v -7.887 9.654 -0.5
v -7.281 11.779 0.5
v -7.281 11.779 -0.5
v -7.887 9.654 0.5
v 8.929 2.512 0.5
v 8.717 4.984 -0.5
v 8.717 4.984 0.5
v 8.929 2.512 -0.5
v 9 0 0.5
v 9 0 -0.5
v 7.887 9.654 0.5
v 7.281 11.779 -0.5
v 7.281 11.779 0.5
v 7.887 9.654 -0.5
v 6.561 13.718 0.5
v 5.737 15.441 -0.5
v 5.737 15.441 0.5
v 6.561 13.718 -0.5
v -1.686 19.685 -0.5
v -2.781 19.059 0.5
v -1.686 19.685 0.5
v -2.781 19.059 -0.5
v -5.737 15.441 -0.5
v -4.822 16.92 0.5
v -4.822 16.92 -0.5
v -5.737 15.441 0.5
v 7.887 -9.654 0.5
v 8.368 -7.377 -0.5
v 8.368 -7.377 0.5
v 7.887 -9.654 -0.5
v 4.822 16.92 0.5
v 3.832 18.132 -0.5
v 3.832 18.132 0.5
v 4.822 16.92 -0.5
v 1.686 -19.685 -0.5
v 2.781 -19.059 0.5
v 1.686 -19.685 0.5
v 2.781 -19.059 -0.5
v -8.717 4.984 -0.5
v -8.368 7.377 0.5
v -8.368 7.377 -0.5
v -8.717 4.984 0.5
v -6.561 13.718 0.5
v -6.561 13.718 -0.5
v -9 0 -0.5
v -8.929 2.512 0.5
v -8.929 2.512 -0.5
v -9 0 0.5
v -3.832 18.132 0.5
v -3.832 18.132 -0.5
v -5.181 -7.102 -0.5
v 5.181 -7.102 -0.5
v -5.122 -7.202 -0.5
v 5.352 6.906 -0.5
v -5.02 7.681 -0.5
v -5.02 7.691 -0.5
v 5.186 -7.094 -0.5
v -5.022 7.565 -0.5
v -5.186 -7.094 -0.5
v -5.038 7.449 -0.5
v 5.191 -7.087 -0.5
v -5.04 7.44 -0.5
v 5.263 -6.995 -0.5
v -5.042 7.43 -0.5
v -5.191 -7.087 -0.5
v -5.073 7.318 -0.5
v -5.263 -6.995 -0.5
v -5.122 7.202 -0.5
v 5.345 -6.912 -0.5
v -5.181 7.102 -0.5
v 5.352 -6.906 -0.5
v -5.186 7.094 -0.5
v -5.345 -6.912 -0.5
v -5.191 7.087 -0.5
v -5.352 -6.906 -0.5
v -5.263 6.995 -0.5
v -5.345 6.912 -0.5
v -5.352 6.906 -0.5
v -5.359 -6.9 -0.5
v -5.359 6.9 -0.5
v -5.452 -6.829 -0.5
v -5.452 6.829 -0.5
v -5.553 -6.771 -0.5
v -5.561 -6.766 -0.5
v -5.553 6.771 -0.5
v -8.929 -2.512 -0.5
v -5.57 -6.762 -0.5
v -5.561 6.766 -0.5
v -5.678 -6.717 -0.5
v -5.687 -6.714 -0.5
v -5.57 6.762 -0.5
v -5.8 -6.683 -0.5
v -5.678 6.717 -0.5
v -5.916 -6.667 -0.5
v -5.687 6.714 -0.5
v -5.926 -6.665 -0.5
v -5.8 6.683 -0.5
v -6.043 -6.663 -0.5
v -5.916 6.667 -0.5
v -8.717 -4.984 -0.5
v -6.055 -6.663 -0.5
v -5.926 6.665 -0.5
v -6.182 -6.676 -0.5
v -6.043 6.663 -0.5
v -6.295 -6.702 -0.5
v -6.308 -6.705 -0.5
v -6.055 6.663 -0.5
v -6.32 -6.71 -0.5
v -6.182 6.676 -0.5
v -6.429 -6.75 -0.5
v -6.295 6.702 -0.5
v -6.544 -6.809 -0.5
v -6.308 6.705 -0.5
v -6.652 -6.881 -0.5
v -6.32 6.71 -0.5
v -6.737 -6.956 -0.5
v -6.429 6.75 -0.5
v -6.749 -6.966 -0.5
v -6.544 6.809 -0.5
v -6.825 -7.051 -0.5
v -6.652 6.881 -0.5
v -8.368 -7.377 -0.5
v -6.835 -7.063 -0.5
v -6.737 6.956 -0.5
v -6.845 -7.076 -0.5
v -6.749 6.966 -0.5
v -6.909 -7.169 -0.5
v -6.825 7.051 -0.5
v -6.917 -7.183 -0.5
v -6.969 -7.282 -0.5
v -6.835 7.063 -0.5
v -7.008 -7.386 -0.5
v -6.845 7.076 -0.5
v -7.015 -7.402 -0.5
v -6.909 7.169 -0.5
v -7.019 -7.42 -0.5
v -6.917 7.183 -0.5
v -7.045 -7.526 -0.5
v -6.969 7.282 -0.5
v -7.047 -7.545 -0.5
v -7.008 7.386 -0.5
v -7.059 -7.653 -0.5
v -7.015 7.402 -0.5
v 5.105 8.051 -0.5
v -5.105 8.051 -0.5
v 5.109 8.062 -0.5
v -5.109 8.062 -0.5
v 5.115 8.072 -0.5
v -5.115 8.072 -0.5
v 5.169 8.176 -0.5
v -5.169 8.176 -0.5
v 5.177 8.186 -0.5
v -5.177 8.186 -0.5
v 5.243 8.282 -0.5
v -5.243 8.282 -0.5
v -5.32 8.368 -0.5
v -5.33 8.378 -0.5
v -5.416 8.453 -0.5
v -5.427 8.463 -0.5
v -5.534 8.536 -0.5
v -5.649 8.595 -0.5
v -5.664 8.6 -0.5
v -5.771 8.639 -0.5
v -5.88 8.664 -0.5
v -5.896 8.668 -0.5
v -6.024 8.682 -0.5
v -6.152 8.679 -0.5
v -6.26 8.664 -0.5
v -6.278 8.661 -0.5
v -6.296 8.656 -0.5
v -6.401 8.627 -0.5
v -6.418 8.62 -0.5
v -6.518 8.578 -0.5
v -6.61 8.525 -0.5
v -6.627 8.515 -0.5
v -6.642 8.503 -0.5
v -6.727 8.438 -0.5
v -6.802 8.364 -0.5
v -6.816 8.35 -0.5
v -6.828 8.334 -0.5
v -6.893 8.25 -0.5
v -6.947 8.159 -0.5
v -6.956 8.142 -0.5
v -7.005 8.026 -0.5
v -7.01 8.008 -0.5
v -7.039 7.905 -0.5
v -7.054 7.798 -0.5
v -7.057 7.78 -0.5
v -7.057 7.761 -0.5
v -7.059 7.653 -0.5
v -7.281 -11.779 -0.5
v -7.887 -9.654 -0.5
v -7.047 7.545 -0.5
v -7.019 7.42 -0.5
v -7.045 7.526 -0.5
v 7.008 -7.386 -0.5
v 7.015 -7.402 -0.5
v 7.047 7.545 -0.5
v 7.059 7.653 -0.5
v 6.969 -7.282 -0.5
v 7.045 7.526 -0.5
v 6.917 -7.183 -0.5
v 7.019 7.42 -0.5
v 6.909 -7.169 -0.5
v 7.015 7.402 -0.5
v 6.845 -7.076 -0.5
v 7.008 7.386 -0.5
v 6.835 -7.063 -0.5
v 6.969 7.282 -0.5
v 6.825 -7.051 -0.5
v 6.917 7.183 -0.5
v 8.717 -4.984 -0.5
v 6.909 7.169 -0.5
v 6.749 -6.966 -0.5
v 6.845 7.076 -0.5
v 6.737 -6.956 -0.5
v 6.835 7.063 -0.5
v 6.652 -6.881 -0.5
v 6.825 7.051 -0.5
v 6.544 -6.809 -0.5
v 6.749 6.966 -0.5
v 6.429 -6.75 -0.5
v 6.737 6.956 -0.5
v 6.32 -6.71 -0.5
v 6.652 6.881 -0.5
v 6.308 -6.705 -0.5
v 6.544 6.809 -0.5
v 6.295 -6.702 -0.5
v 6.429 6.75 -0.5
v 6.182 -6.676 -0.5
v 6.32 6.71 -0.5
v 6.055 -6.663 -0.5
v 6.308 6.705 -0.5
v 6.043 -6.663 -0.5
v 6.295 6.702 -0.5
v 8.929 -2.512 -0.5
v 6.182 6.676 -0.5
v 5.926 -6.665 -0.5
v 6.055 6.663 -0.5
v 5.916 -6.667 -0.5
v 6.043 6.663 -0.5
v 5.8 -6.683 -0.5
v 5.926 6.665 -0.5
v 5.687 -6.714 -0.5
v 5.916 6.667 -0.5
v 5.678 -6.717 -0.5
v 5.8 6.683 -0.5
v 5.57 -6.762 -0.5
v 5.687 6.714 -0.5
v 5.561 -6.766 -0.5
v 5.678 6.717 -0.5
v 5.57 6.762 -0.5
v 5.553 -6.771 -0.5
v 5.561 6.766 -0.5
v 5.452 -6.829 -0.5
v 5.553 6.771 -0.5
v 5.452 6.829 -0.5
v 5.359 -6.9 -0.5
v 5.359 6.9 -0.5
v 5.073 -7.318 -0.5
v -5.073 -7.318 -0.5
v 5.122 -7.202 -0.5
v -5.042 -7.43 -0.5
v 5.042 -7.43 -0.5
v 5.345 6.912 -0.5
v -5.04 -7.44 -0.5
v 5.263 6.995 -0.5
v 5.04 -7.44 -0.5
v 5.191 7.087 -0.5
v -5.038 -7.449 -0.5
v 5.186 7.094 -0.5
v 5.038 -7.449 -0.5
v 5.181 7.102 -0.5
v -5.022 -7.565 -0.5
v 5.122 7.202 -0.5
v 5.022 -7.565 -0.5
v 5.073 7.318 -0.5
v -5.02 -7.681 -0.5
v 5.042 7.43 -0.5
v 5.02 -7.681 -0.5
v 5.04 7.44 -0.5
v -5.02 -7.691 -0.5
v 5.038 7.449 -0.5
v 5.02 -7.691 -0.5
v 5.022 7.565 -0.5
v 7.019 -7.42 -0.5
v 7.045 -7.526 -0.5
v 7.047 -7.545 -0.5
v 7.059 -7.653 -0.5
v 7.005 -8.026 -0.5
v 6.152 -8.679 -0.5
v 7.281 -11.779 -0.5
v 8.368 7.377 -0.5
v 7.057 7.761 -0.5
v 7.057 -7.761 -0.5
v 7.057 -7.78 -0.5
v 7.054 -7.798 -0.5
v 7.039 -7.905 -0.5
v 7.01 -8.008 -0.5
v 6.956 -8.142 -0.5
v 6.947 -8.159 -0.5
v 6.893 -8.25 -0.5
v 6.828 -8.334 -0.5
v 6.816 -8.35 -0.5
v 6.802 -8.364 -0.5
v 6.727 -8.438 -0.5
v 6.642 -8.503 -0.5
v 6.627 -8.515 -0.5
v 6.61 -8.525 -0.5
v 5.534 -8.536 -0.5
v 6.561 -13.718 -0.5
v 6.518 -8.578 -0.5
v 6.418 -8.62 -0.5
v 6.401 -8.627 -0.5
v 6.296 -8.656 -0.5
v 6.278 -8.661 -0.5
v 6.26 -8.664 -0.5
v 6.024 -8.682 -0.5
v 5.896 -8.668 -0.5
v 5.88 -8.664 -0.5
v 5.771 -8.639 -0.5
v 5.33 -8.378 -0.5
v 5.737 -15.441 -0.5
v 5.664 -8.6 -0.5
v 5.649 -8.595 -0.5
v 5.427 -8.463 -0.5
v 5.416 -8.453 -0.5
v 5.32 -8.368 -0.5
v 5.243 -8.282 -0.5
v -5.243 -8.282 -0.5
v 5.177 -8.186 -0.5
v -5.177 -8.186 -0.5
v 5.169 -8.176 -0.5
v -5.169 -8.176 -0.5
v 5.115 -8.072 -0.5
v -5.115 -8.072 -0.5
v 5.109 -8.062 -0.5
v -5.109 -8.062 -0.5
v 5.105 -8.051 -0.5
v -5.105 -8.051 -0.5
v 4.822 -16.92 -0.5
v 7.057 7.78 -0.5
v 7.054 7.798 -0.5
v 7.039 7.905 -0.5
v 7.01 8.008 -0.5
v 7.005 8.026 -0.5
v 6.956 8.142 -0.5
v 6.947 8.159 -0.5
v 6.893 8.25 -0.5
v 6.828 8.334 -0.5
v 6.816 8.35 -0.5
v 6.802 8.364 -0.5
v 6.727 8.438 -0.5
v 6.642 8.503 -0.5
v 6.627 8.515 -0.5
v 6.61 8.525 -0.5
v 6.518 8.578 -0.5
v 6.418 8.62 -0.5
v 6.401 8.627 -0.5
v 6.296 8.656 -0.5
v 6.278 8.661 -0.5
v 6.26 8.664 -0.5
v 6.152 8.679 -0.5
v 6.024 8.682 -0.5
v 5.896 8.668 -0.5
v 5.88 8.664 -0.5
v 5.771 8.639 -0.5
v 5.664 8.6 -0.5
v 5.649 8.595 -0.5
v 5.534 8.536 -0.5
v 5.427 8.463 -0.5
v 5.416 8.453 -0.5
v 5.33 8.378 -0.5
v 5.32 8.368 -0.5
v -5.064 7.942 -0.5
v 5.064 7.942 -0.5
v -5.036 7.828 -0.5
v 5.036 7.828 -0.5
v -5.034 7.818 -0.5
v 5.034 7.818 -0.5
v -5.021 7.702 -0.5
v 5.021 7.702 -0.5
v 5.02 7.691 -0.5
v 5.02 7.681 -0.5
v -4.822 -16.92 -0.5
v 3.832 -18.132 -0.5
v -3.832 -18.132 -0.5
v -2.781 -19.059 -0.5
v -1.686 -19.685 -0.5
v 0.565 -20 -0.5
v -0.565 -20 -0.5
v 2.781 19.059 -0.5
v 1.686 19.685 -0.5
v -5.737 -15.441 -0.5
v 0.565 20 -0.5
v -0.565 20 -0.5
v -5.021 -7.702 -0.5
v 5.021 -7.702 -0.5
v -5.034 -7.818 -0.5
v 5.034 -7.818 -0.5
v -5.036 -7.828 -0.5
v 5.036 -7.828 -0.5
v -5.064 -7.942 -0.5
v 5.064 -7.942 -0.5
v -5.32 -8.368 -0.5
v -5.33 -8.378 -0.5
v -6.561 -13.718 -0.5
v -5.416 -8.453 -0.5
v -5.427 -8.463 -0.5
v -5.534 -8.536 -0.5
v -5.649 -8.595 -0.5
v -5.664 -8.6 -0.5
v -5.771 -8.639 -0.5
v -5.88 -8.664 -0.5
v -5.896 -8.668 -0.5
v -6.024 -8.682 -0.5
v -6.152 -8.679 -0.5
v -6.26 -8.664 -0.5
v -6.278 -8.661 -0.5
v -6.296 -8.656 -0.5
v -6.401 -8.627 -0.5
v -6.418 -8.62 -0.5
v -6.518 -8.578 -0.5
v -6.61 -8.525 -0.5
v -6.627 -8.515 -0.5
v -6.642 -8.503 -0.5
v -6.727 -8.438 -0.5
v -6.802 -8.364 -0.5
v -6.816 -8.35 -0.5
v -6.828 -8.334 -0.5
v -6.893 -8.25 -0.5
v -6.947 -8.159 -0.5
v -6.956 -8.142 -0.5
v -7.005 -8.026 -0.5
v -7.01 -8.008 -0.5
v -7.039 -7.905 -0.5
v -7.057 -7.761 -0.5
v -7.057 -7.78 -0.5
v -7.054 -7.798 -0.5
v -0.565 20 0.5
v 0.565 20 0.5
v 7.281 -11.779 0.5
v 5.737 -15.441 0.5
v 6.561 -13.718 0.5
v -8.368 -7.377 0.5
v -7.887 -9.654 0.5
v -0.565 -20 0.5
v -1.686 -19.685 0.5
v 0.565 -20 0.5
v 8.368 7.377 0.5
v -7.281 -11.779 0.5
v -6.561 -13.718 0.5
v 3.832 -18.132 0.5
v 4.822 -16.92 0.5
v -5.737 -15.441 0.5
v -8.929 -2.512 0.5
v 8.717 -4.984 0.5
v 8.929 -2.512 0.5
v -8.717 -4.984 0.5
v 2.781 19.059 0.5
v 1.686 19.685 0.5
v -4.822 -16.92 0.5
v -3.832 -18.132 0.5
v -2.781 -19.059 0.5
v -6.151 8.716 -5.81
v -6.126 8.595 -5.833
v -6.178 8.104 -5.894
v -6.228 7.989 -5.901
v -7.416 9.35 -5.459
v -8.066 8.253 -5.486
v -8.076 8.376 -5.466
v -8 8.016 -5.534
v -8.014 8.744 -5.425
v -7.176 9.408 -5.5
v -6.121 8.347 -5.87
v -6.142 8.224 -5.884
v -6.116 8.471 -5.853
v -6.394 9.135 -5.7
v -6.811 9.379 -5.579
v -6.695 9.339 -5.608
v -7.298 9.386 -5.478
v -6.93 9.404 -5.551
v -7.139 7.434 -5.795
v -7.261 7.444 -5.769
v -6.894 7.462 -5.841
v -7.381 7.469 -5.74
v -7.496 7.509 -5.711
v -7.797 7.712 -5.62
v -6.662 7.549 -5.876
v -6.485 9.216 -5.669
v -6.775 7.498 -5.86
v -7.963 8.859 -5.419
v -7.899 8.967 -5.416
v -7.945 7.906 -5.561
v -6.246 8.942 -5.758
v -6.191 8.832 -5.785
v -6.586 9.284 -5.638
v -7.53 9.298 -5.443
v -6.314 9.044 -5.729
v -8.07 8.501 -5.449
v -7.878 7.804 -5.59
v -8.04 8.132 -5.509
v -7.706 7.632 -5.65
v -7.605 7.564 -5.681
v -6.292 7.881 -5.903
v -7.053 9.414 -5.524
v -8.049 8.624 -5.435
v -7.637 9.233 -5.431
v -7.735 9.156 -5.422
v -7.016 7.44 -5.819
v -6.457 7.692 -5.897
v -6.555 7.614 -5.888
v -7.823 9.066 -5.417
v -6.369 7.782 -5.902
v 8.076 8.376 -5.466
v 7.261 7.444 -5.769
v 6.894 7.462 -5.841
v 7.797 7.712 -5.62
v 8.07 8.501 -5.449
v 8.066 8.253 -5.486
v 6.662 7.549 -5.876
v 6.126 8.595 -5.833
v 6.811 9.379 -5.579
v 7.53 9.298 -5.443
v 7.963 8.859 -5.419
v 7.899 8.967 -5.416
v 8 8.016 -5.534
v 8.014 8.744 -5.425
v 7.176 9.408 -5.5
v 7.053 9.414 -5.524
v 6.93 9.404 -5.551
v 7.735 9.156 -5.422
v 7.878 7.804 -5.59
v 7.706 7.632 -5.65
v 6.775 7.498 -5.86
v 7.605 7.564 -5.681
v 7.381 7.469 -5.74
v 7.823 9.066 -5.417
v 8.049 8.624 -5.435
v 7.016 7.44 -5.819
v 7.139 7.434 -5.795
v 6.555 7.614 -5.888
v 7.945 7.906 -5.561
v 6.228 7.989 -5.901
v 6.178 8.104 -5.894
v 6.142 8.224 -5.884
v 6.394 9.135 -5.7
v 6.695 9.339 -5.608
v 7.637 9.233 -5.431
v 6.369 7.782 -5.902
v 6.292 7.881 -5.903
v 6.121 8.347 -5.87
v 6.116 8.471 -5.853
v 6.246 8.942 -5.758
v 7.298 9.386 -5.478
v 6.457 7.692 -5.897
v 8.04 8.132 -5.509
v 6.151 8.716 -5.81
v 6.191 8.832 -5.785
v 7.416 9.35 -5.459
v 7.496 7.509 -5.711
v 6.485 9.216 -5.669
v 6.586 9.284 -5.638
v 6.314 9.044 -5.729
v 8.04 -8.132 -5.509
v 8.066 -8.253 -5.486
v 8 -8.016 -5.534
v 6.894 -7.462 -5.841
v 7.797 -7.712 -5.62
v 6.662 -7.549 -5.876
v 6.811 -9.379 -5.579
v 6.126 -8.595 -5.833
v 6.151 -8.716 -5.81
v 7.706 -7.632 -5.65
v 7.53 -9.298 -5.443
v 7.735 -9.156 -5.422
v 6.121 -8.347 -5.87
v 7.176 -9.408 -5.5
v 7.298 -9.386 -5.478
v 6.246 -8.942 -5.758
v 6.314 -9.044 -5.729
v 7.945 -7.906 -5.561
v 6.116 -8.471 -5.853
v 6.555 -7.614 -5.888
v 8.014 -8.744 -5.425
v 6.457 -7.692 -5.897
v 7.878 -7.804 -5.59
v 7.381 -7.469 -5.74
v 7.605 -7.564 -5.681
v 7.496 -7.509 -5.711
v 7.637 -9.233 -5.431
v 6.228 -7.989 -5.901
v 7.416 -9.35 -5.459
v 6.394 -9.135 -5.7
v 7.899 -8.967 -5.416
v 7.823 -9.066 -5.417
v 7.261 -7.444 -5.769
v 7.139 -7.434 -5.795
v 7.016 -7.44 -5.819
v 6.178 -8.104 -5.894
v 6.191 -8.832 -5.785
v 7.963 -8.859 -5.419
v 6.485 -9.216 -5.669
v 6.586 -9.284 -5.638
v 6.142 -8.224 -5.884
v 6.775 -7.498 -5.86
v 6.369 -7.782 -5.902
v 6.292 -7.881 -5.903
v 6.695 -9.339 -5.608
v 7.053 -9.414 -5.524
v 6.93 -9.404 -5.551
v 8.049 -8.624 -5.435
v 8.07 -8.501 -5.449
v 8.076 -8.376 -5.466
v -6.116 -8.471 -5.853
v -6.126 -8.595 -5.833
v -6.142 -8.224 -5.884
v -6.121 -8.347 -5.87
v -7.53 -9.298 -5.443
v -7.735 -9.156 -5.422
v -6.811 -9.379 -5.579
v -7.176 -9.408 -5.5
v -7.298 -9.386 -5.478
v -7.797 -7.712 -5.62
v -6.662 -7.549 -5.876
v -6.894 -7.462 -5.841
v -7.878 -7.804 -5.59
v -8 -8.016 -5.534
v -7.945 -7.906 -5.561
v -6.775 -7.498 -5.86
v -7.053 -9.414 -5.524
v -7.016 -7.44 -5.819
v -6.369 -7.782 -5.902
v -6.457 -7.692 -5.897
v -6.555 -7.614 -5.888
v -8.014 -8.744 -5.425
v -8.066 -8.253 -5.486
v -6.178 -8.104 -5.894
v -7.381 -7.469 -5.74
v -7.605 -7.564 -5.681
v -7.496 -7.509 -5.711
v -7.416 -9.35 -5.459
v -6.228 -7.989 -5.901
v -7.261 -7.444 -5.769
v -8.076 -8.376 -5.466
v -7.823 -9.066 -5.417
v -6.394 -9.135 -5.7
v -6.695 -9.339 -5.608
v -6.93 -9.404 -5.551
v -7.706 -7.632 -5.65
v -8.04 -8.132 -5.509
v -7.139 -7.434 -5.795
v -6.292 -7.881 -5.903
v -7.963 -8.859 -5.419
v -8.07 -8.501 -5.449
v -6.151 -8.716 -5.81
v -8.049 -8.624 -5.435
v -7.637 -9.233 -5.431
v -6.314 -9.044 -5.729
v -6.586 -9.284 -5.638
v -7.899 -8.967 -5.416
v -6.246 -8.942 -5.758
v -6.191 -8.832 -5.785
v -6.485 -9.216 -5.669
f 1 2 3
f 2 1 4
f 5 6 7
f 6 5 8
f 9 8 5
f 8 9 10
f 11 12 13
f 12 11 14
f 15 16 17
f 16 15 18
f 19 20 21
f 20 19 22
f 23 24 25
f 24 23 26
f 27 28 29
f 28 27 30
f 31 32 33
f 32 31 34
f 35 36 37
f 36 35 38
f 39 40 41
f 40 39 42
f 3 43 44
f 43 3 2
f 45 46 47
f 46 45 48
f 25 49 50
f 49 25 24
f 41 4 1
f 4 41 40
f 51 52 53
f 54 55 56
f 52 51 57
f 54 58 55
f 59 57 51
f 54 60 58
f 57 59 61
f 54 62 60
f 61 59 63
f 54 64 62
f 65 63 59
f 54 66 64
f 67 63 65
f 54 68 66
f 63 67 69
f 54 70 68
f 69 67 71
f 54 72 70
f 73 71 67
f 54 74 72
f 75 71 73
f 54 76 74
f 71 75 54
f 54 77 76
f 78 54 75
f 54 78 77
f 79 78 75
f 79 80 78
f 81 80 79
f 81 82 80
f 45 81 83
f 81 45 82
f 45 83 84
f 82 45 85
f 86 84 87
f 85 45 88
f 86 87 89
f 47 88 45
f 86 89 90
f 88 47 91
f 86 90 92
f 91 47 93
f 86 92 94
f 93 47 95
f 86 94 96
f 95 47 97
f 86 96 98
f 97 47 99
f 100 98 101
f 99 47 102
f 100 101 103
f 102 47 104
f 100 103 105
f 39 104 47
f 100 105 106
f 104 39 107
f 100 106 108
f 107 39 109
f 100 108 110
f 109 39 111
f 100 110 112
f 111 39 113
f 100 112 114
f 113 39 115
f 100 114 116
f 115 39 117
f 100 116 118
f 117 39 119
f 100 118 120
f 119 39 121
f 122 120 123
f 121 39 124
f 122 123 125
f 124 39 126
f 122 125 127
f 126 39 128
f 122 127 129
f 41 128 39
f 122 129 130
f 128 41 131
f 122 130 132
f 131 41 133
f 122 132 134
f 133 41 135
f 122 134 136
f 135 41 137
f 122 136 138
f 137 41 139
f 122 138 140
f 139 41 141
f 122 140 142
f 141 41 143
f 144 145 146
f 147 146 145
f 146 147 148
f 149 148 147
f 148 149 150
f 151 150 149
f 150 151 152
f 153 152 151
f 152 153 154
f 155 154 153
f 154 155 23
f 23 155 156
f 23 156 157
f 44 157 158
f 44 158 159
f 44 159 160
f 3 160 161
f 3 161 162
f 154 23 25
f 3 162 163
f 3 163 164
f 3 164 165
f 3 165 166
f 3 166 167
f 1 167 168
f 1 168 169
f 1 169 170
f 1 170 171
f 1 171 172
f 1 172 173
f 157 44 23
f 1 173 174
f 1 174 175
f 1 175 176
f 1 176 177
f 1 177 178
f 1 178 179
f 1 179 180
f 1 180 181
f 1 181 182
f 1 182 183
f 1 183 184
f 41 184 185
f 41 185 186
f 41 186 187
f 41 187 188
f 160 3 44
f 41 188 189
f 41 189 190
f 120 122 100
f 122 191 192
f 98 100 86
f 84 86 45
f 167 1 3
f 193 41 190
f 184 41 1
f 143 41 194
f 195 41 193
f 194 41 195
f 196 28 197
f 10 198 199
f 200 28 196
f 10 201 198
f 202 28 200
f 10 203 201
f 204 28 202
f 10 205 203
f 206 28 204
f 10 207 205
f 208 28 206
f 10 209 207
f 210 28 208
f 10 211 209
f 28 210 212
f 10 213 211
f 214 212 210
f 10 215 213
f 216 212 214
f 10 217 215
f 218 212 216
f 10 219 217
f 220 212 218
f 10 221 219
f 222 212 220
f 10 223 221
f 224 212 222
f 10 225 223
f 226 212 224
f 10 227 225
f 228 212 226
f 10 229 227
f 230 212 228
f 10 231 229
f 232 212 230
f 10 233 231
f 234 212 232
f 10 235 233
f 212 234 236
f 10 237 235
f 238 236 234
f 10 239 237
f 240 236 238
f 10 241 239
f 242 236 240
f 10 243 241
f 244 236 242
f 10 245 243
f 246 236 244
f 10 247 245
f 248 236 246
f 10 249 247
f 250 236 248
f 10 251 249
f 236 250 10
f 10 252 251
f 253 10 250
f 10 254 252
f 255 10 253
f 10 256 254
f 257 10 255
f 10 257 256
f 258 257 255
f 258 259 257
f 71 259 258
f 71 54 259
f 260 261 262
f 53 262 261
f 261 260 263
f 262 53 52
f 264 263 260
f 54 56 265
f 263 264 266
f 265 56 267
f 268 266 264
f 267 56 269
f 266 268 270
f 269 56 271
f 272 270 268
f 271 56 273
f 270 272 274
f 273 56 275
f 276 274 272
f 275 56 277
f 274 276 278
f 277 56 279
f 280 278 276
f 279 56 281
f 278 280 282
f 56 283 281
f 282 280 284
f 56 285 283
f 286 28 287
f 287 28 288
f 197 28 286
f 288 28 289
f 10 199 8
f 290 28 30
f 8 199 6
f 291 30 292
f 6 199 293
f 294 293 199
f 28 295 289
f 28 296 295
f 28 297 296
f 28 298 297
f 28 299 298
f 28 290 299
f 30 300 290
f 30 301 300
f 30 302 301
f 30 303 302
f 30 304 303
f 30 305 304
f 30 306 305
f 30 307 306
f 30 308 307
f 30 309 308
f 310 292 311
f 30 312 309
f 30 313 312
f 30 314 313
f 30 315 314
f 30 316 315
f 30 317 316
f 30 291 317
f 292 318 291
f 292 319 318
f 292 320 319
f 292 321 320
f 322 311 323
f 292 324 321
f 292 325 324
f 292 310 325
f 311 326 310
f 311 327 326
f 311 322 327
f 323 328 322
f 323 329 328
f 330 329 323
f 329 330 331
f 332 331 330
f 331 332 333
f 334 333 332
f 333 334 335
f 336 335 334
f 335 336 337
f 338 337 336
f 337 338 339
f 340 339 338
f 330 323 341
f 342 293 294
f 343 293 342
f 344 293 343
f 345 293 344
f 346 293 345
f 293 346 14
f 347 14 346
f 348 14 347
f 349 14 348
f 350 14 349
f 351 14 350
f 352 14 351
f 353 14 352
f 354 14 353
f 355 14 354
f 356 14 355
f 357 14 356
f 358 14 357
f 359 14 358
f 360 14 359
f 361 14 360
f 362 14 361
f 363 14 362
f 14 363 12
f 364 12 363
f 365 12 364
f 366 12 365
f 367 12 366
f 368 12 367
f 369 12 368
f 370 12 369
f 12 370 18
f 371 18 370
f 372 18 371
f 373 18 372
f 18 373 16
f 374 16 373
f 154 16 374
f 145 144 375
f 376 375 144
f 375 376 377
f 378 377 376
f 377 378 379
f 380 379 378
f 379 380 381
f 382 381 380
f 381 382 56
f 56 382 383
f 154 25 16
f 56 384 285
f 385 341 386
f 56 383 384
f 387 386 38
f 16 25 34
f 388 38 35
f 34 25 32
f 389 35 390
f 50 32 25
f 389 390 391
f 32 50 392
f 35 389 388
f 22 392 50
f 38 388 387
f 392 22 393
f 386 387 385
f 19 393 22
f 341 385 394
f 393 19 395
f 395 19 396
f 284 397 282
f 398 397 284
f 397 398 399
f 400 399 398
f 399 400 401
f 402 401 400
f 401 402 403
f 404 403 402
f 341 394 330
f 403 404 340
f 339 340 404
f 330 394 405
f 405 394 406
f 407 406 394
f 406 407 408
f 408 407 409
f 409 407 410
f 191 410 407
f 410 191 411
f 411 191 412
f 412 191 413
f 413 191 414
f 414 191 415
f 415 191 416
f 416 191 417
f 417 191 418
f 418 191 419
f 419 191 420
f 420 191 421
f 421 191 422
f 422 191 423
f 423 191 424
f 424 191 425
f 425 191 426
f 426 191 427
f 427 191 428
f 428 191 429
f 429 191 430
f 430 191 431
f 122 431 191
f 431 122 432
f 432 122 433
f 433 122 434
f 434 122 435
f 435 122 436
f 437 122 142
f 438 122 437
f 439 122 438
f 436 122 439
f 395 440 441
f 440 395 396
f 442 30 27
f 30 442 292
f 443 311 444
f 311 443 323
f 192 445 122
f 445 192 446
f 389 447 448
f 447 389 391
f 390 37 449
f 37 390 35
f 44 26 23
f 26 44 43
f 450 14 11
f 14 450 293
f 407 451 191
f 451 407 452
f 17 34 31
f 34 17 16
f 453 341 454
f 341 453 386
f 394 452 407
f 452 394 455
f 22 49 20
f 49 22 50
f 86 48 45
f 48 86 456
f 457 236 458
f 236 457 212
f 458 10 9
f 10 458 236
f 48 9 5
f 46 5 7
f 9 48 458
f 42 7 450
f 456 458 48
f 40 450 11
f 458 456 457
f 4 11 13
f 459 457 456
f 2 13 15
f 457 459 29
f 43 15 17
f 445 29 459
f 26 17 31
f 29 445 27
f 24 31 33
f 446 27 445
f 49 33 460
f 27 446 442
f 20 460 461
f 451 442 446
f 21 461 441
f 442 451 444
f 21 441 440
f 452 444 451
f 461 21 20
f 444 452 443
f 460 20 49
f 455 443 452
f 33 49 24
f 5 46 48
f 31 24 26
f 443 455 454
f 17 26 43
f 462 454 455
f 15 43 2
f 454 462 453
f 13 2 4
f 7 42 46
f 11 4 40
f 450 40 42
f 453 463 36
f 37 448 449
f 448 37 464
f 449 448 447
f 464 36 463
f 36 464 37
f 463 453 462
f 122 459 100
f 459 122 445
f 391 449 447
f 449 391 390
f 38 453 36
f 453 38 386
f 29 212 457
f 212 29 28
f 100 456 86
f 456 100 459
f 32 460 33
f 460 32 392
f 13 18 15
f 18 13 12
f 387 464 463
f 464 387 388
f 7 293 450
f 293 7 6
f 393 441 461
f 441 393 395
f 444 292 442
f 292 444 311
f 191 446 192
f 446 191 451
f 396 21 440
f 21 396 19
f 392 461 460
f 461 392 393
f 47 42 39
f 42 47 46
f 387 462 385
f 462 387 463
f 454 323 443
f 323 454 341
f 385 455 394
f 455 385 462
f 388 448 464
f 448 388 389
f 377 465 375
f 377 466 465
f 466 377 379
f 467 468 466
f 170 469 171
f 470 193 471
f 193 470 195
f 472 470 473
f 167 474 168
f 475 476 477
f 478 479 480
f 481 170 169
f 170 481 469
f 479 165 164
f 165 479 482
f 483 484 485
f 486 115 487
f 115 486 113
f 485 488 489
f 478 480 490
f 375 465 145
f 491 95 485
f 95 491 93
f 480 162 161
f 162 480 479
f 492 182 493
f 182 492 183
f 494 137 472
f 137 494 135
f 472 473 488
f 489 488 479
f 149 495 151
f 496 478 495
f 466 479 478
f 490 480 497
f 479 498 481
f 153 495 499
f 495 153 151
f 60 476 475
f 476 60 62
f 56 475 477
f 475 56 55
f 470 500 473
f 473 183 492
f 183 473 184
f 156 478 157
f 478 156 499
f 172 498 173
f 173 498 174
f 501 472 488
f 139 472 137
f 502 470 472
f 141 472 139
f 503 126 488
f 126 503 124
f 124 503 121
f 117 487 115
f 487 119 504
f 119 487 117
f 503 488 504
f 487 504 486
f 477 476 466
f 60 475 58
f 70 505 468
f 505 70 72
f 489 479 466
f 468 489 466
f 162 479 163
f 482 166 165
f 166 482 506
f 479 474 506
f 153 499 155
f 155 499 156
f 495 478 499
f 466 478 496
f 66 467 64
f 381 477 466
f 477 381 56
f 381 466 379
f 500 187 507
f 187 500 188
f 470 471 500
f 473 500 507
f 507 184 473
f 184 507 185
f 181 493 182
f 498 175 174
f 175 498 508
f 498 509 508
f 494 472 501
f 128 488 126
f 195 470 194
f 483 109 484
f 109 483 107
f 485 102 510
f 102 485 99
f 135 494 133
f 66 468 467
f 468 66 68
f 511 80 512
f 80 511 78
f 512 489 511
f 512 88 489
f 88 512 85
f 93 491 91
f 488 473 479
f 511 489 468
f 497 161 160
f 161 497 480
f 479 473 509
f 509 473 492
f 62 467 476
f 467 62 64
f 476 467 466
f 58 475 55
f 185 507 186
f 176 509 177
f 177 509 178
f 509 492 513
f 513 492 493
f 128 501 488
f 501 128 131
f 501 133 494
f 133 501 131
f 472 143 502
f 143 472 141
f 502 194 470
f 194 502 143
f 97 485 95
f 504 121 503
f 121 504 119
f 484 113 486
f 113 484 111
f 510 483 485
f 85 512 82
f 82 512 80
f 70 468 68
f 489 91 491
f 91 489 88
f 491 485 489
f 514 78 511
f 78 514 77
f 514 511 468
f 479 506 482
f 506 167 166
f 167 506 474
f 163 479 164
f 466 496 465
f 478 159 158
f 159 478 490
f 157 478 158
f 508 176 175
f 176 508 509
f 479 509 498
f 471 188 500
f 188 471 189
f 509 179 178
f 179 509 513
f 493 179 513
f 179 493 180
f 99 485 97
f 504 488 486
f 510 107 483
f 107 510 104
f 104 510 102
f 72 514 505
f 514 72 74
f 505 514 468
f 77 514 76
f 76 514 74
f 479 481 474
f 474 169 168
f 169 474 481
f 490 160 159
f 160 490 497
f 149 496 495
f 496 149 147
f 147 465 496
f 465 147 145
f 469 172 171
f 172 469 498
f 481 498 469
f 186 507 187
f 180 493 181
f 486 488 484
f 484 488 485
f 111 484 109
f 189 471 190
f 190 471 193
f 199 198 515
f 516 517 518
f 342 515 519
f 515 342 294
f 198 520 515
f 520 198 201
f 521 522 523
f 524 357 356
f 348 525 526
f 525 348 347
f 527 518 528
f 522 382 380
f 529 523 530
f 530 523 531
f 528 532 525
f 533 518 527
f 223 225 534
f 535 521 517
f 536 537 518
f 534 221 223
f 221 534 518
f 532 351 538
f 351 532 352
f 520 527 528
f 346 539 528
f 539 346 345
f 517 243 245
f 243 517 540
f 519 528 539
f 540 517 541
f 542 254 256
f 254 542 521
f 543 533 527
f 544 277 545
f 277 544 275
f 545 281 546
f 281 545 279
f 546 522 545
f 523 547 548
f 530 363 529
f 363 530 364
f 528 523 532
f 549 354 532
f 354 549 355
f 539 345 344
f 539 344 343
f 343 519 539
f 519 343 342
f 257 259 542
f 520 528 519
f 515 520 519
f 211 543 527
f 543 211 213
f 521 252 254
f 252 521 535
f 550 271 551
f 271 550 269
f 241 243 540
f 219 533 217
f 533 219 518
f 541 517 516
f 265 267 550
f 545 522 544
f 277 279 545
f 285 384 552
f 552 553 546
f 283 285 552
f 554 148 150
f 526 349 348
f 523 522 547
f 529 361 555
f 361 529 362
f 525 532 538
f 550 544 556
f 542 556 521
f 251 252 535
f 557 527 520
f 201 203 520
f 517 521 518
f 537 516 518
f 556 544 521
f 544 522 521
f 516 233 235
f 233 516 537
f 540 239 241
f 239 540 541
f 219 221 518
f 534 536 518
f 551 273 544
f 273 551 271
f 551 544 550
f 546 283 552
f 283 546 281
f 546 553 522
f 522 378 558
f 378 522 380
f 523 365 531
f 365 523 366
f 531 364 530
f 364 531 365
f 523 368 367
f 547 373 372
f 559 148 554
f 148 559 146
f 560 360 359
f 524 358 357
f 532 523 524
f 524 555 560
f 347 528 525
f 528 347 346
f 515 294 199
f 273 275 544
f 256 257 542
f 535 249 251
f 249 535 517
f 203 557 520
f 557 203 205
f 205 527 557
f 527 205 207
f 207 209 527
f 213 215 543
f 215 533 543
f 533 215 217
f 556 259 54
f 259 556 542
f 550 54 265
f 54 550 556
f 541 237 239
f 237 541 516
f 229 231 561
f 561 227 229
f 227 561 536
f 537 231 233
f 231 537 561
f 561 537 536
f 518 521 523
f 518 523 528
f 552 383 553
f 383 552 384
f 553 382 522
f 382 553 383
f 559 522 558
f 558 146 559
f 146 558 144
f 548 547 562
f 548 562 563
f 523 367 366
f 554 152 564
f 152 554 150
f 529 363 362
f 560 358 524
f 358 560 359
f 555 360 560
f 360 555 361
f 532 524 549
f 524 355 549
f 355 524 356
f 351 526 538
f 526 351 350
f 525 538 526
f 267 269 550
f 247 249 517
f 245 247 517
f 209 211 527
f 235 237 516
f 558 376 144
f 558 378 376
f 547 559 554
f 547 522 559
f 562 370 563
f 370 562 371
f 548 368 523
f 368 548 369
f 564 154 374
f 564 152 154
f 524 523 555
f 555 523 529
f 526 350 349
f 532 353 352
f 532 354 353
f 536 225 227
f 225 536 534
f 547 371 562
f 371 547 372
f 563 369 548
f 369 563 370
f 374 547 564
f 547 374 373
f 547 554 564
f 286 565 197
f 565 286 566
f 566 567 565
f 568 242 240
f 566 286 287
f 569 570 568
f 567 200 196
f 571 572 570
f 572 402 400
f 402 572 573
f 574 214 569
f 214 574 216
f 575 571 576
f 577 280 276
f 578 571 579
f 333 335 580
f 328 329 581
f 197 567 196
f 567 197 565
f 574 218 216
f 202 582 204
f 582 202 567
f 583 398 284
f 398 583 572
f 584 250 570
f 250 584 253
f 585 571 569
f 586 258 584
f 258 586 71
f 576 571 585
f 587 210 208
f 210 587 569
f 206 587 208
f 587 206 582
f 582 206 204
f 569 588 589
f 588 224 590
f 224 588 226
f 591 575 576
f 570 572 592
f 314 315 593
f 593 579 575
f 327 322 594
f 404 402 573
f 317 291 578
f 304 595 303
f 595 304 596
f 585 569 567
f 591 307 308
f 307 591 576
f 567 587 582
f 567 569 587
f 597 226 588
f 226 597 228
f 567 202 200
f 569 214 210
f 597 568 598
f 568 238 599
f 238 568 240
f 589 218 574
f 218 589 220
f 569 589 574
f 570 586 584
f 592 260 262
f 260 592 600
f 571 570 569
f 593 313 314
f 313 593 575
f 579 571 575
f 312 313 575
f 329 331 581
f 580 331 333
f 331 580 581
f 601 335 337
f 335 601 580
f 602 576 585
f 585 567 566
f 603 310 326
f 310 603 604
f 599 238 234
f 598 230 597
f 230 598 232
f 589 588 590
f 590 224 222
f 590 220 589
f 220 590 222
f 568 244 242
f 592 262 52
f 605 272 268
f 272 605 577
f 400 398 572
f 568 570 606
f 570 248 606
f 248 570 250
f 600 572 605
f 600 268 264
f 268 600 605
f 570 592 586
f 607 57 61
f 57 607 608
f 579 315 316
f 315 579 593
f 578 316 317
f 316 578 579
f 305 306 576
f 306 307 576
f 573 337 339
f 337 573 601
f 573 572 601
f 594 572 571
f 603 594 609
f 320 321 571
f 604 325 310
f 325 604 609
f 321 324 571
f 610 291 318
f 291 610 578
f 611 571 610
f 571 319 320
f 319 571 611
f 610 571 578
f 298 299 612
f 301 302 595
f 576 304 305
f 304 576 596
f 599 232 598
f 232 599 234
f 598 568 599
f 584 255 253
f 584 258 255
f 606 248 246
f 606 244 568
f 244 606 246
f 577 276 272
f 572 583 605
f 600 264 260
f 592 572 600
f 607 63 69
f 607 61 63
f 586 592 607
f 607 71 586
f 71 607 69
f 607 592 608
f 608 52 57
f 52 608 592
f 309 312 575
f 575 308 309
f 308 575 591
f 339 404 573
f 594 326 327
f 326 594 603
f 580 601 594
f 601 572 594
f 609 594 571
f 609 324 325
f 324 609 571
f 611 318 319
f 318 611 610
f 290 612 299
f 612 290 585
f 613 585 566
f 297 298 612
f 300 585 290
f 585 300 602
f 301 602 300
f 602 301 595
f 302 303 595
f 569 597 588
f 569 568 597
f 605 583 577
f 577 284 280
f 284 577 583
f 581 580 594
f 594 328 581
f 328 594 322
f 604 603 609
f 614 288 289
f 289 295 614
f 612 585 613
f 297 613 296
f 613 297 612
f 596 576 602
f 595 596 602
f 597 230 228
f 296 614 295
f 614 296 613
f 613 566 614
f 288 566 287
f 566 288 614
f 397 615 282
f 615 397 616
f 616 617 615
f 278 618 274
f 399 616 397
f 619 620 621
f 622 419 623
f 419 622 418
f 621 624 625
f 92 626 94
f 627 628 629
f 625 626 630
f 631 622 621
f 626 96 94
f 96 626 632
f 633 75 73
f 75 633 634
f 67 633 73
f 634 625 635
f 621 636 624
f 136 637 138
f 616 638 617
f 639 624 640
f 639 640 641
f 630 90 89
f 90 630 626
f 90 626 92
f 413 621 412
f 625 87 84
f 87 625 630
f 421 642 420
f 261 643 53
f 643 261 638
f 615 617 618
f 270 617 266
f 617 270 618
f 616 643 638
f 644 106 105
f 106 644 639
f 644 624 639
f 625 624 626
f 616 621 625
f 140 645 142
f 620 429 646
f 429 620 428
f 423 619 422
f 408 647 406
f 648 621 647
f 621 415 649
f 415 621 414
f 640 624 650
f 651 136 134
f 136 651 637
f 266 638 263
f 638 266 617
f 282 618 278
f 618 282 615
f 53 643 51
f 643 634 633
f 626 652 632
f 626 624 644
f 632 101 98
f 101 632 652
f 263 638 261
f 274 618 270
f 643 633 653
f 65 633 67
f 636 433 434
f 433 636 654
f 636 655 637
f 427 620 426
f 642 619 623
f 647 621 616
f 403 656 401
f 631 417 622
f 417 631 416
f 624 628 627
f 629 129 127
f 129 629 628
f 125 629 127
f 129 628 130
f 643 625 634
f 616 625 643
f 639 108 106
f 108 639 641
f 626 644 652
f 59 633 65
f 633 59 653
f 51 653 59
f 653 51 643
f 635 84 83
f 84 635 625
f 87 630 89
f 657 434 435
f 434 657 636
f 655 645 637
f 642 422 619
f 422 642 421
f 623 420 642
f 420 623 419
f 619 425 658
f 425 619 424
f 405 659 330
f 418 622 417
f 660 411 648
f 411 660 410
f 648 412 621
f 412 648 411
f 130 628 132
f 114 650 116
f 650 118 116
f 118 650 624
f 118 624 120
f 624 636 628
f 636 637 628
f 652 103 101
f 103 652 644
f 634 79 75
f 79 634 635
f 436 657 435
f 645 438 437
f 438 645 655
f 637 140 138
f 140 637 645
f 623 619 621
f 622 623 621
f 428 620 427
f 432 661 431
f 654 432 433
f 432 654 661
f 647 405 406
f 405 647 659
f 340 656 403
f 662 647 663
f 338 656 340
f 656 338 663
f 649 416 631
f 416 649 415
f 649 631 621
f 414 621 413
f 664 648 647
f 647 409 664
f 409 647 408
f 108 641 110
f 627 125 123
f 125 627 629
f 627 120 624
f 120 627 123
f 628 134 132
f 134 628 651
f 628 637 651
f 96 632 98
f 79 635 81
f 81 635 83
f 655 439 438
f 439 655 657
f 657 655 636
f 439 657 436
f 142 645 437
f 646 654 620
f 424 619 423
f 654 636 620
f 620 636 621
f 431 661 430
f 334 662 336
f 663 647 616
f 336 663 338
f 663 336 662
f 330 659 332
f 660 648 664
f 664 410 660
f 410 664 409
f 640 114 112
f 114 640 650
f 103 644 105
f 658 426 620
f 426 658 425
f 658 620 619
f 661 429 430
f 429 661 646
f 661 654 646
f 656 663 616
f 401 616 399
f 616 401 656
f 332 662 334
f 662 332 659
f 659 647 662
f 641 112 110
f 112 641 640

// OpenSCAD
$fn=50;
union() {
  resize([18, 40, 1]){
    cylinder(r=10, h=3, center=true);
  }
  translate([-6.5, 8, -2.75]) {
    rotate([10, 10, 10]) {
      cylinder(r=1, h=6, center=true);
    }
  }
  translate([6.5, 8, -2.75]) {
    rotate([10, -10, -10]) {
      cylinder(r=1, h=6, center=true);
    }
  }
  translate([6.5, -8, -2.75]) {
    rotate([-10, -10, 10]) {
      cylinder(r=1, h=6, center=true);
    }
  }
  translate([-6.5, -8, -2.75]) {
    rotate([-10, 10, -10]) {
      cylinder(r=1, h=6, center=true);
    }
  }
}
